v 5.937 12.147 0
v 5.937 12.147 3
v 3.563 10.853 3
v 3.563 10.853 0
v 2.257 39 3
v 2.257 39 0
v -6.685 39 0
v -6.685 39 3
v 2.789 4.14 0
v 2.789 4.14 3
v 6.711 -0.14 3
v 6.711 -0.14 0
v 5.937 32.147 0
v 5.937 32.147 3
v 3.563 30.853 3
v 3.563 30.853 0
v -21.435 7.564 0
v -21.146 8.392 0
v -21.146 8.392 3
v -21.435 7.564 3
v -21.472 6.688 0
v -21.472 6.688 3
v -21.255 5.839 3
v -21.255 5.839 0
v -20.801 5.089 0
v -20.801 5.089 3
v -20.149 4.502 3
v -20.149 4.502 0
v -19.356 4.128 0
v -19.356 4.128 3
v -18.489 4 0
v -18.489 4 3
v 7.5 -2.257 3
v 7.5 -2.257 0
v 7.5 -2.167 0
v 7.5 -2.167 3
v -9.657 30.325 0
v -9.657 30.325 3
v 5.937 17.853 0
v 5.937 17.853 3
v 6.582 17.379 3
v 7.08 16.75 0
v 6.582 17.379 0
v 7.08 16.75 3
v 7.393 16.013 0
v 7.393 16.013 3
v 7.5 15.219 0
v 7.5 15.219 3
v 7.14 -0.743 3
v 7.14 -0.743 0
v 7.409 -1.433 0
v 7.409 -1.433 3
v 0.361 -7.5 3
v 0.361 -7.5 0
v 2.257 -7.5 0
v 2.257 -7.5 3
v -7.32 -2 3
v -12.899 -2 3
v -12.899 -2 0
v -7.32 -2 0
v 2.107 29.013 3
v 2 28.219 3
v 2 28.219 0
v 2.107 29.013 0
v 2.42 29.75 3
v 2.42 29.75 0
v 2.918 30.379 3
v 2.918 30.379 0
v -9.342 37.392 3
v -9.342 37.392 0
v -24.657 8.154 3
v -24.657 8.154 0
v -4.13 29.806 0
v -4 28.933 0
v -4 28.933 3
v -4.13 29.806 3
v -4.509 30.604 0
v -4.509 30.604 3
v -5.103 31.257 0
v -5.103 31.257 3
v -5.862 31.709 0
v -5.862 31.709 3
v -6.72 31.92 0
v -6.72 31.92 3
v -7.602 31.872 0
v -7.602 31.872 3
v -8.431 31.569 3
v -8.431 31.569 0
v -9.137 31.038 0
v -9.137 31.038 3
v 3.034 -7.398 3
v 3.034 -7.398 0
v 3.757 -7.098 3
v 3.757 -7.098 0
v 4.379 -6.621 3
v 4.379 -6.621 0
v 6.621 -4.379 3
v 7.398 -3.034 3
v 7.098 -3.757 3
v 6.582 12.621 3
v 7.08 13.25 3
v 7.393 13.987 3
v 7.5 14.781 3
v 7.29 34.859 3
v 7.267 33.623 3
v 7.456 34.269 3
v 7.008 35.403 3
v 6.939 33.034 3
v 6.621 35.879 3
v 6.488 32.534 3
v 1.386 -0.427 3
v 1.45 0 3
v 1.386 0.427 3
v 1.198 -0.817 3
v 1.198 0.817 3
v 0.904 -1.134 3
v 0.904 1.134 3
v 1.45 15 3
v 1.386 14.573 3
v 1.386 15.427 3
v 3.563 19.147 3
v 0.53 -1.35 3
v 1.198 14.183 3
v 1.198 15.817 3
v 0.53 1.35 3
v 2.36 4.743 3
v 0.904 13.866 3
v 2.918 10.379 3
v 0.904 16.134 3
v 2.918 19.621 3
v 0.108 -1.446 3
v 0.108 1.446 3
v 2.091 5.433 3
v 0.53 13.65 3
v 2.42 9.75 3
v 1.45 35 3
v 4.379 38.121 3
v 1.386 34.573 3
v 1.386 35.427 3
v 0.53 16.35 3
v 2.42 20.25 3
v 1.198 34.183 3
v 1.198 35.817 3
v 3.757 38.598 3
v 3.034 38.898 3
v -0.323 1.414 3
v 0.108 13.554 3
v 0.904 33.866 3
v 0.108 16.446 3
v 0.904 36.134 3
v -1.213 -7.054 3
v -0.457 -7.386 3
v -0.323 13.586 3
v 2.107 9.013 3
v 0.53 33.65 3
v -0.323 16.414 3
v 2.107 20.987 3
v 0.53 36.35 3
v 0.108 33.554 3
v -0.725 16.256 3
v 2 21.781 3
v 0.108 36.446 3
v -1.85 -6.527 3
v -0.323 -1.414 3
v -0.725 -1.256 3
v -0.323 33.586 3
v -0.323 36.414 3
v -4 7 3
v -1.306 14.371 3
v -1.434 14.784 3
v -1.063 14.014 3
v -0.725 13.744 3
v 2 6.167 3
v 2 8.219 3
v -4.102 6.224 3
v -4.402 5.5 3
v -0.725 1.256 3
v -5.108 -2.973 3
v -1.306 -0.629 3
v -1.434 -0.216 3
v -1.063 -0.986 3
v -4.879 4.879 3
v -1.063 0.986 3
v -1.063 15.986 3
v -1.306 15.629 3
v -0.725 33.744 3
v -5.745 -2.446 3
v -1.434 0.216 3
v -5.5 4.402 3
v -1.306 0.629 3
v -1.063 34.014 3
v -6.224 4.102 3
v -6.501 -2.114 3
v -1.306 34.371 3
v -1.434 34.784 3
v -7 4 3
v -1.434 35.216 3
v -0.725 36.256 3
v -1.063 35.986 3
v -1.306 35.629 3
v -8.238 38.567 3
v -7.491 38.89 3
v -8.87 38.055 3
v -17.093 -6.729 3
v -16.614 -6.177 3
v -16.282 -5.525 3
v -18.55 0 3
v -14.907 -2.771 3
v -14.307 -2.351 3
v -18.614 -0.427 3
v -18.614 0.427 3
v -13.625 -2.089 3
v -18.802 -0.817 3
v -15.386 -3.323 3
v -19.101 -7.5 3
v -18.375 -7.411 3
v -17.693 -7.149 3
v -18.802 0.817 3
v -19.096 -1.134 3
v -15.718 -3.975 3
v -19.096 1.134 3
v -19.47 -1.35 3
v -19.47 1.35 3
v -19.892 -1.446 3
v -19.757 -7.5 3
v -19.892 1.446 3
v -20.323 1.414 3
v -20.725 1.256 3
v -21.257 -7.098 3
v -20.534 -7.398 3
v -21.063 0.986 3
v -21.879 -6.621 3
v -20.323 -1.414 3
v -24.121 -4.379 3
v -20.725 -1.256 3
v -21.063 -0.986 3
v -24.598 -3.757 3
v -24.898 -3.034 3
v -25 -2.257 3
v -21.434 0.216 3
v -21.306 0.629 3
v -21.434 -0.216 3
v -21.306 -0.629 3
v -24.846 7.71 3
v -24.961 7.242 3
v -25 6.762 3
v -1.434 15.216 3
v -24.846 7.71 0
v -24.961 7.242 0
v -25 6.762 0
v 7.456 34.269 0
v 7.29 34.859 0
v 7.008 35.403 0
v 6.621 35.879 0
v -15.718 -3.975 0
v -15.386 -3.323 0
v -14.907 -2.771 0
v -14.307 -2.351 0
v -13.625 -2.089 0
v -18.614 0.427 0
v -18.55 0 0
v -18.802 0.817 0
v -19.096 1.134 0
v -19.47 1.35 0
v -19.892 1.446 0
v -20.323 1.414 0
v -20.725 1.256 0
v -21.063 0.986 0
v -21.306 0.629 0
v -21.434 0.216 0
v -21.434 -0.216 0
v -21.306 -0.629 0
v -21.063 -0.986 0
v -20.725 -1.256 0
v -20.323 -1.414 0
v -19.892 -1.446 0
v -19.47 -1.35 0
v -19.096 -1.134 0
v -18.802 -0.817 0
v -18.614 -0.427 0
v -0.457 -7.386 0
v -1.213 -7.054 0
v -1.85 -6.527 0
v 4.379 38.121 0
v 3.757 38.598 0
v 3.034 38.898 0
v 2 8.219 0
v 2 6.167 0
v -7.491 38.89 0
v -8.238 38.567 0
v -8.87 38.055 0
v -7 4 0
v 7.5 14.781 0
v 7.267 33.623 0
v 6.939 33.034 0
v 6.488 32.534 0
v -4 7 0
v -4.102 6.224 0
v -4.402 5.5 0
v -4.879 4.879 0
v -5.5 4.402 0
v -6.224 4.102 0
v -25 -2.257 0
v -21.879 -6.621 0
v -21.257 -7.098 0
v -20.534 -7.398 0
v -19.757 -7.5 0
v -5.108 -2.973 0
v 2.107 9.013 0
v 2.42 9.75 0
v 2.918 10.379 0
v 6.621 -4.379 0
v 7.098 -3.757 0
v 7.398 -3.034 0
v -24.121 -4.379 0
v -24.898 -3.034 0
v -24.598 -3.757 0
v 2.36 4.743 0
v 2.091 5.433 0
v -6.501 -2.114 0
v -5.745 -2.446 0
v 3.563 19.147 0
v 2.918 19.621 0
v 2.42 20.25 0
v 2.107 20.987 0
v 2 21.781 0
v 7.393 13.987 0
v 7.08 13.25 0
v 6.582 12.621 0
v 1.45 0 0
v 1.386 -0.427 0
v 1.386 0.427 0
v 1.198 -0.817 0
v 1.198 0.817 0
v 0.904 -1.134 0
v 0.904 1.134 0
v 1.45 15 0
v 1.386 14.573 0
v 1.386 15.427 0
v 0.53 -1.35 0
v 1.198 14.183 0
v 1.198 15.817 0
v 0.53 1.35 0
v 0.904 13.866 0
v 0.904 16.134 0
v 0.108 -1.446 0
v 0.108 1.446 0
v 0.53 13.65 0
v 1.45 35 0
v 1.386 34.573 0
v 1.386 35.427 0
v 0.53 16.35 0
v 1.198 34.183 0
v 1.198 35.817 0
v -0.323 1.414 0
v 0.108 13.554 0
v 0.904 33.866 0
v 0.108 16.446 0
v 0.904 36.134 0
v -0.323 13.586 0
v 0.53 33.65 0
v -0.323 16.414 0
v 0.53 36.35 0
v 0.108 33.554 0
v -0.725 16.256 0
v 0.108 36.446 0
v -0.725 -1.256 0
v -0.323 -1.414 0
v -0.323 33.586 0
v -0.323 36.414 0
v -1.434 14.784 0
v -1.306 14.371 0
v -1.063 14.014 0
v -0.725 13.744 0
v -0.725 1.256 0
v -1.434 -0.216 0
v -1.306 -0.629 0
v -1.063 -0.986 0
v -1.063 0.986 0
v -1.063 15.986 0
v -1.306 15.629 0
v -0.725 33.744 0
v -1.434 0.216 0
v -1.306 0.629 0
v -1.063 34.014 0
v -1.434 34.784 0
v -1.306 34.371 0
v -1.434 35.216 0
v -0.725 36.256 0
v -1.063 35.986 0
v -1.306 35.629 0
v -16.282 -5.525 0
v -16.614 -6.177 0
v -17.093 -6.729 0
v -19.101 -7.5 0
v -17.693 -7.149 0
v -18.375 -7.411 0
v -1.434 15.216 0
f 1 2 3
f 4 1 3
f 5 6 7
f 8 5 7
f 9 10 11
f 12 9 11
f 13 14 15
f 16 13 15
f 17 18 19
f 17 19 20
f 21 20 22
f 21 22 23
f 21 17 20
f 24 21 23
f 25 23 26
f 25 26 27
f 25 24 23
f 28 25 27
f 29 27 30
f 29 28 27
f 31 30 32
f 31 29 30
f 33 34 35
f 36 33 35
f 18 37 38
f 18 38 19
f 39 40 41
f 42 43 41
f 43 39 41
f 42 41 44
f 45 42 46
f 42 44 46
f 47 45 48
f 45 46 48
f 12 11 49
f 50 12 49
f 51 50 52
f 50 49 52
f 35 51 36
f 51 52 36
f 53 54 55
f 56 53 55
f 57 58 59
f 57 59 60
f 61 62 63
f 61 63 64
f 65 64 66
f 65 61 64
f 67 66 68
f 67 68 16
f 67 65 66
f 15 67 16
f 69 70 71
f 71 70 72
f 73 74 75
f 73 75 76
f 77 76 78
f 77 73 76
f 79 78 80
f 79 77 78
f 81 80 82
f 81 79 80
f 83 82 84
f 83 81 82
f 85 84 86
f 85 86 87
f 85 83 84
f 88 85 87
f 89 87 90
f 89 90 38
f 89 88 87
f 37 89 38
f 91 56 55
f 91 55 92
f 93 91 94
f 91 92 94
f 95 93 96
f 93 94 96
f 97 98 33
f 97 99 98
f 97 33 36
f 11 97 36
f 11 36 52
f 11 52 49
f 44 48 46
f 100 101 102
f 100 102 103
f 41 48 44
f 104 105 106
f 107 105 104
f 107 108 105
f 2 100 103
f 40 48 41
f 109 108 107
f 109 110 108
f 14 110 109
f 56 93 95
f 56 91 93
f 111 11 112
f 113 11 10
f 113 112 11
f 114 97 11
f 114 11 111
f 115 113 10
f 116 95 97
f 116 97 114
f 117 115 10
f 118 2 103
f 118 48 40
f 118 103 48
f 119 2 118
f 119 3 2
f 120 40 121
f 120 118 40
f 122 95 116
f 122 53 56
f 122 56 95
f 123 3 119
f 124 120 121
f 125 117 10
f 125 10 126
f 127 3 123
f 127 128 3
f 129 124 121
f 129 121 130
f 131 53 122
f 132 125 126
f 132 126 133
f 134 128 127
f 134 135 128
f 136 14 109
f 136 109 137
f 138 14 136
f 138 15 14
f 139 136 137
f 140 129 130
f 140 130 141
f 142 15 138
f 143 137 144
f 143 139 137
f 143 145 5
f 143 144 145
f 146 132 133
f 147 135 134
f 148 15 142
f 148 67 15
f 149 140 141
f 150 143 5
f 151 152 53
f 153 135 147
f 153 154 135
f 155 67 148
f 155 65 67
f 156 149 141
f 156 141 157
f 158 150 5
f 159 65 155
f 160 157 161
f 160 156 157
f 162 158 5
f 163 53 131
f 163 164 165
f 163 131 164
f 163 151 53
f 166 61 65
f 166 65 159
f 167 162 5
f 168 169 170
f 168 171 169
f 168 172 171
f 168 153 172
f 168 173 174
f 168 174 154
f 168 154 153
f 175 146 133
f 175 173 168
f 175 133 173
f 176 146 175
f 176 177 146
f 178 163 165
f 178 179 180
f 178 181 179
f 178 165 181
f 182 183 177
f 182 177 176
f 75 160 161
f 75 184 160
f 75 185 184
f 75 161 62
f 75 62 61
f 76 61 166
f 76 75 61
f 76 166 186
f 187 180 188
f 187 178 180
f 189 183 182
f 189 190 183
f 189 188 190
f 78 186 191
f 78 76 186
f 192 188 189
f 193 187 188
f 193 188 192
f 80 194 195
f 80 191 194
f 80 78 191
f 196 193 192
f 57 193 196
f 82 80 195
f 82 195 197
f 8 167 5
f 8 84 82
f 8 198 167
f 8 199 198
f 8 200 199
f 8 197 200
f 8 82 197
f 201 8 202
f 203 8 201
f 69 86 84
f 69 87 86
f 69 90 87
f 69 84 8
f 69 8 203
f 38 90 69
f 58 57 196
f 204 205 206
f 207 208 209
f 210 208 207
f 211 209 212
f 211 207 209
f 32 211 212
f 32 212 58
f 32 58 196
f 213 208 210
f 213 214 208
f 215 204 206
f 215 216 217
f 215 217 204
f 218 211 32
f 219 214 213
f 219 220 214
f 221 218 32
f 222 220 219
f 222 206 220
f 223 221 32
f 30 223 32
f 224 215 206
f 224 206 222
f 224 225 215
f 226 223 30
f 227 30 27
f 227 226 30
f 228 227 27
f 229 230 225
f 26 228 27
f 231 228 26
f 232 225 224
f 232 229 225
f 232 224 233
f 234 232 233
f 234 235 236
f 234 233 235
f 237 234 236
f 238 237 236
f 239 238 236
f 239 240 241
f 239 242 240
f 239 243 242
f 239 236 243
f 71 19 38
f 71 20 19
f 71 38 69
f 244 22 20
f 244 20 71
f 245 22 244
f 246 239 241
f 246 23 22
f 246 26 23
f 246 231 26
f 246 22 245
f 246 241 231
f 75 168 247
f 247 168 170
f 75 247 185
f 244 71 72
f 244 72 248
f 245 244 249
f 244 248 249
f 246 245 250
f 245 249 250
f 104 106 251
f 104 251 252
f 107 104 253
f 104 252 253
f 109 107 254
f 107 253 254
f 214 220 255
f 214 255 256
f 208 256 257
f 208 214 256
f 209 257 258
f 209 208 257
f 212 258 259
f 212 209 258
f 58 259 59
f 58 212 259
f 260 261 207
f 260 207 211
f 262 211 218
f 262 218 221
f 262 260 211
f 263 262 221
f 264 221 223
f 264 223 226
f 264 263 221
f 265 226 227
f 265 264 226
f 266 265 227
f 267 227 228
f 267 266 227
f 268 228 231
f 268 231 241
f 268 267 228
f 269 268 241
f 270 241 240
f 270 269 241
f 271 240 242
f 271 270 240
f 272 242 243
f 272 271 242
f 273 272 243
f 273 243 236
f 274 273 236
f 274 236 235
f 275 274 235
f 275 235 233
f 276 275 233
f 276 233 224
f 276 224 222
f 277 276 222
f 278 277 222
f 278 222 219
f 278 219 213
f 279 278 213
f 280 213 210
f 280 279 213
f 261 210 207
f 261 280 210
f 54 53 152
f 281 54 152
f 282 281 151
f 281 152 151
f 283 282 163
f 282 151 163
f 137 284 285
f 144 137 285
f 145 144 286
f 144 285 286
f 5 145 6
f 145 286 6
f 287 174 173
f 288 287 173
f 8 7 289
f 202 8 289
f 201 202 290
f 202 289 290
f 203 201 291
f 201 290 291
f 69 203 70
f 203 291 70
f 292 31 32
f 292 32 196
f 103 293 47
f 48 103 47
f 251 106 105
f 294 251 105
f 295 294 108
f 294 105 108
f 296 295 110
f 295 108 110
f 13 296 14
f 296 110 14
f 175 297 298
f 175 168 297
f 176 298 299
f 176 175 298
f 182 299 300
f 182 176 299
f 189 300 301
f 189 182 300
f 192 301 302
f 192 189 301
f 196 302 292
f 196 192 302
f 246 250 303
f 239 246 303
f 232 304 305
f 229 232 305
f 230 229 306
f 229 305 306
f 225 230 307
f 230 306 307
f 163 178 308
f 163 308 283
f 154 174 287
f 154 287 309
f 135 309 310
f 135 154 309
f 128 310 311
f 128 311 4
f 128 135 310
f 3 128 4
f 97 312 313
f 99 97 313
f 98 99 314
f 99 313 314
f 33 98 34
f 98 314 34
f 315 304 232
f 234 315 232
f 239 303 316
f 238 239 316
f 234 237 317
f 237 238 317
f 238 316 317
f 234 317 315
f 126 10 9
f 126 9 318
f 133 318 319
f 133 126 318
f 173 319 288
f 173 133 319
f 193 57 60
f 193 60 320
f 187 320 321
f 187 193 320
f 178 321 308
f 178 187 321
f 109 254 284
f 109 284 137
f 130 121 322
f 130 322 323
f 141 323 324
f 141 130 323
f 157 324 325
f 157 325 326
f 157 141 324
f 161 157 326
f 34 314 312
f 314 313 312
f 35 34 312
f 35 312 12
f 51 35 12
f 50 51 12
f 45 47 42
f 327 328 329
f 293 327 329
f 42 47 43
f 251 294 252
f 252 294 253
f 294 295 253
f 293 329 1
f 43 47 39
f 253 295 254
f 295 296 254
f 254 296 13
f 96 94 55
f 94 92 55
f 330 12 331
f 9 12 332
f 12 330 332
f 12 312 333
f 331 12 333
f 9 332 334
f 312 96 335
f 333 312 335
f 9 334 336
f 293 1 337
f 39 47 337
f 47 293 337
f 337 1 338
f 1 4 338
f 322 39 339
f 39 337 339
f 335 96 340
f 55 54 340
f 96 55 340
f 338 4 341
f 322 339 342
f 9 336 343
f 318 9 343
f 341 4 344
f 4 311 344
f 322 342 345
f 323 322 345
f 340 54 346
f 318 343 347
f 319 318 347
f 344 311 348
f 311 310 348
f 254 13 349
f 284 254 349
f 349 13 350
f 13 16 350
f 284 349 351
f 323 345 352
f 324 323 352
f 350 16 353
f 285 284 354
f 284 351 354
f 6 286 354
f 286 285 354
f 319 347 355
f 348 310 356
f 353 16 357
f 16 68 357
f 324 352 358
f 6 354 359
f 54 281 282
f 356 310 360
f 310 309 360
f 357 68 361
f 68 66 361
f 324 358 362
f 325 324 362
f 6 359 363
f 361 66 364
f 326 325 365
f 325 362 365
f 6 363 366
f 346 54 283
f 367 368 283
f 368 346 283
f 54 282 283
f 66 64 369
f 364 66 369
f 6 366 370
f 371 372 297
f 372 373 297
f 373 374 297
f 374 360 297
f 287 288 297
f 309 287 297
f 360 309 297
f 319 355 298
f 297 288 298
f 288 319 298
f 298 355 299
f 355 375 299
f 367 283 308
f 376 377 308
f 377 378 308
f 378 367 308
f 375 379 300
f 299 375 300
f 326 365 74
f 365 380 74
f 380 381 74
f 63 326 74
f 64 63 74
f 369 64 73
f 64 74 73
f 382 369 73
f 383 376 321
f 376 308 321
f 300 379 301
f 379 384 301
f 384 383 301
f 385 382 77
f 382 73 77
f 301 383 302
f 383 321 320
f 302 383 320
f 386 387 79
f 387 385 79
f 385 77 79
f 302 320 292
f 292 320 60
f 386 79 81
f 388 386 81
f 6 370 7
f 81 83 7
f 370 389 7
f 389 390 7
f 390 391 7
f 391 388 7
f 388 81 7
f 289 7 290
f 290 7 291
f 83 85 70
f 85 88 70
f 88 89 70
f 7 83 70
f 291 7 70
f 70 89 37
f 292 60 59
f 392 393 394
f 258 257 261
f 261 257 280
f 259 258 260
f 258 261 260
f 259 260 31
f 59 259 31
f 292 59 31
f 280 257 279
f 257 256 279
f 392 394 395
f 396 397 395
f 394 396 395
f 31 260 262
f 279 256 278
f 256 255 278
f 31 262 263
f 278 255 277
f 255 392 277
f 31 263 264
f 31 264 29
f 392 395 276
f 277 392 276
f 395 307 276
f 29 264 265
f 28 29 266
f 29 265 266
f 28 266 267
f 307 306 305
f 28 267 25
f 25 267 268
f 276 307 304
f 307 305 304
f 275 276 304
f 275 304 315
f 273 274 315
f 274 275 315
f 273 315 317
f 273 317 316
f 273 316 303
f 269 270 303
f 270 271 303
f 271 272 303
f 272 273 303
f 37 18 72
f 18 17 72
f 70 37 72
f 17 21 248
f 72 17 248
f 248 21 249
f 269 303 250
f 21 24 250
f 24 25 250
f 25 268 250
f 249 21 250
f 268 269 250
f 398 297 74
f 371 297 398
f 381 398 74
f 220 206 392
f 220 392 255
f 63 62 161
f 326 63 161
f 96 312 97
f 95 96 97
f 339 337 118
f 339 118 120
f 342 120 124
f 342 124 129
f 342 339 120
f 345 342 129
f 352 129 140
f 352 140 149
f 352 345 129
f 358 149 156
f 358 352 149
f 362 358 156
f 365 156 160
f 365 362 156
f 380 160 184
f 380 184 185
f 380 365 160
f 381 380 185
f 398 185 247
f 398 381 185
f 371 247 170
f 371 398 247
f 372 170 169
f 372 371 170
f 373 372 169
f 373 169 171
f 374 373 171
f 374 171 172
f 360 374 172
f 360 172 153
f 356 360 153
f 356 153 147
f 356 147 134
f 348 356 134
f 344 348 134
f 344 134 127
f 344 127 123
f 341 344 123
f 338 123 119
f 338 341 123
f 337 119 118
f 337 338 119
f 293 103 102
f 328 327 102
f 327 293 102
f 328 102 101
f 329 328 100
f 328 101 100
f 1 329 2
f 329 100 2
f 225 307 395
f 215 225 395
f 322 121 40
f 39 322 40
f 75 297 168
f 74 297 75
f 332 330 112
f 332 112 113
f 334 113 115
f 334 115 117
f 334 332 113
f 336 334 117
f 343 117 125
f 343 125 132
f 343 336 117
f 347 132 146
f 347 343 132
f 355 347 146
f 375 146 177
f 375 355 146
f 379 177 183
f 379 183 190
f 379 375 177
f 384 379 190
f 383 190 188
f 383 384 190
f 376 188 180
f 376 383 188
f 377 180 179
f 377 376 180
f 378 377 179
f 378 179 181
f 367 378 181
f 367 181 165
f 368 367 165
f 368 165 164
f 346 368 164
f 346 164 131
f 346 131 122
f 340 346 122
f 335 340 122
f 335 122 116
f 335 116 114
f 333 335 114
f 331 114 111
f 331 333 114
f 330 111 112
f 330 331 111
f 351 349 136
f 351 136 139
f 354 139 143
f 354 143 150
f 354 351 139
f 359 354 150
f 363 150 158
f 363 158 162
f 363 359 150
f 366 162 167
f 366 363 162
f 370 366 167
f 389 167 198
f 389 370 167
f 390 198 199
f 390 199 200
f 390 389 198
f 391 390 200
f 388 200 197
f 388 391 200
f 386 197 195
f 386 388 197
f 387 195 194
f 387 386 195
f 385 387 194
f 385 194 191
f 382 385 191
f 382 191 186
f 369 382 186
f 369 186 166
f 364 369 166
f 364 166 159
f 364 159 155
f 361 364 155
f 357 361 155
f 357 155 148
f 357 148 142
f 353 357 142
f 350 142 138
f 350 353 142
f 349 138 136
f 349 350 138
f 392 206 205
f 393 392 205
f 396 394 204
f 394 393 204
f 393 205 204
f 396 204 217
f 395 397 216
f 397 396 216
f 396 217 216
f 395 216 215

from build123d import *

# Parameters (mm, degrees)
SKETCH_1_R          = 1.45
EXTRUDE_1_DEPTH     = 3
CHAMFER_1_SIZE      = 4
CUT_EXTRUDE_1_DEPTH = 47.421977554
FILLET_1_R          = 3
FILLET_2_R          = 3


with BuildPart() as part:
    # 草图1 → 凸台-拉伸1 (new body)
    with BuildSketch(Plane.XY):
        Polygon((-25, 7.5), (-25, -7.5), (7.5, -7.5), (7.5, 39), (-8.5, 39), align=None)
        with Locations((-20, 0)):
            Circle(SKETCH_1_R, mode=Mode.SUBTRACT)
        Circle(SKETCH_1_R, mode=Mode.SUBTRACT)
        with Locations((0, 15)):
            Circle(SKETCH_1_R, mode=Mode.SUBTRACT)
        with Locations((0, 35)):
            Circle(SKETCH_1_R, mode=Mode.SUBTRACT)
        with BuildLine():
            Line((-9.657494606, 30.324817794), (-21.146102459, 8.392020984))
            ThreePointArc((-21.146102459, 8.392020984), (-21.055323941, 5.446948641), (-18.488607853, 4))
            Line((-18.488607853, 4), (-4, 4))
            Line((-4, 4), (-4, 28.93279681))
            ThreePointArc((-4, 28.93279681), (-6.283230796, 31.845912308), (-9.657494606, 30.324817794))
        make_face(mode=Mode.SUBTRACT)
    extrude(amount=EXTRUDE_1_DEPTH)

    # 倒角1
    chamfer_1_edges = [part.edges().sort_by_distance(p)[0] for p in [
        (7.5, 39, 1.5),
        (7.5, -7.5, 1.5),
        (-25, -7.5, 1.5),
    ]]
    chamfer(chamfer_1_edges, length=CHAMFER_1_SIZE)

    # 草图2 → 切除-拉伸1 (cut, through all)
    with BuildSketch(Plane.XY.offset(3)):
        Polygon((-17, -7.5), (-15, -2), (-6, -2), (-0.958333333, -7.5), align=None)
        Polygon((7.5, 33), (2, 30), (2, 20), (7.5, 17), align=None)
        Polygon((7.5, 13), (2, 10), (2, 5), (7.5, -1), align=None)
    extrude(amount=-CUT_EXTRUDE_1_DEPTH, mode=Mode.SUBTRACT)

    # 圆角1
    fillet_1_edges = [part.edges().sort_by_distance(p)[0] for p in [
        (-4, 4, 1.5),
    ]]
    fillet(fillet_1_edges, radius=FILLET_1_R)

    # 圆角2
    # the kernel refuses this fillet: 3 mm, written as the material it adds along each edge
    with BuildSketch(Plane(origin=(2, 5, 3), x_dir=(0, 1, 0), z_dir=(0, 0, -1))) as fillet_2_piece_1:
        with BuildLine():
            CenterArc((FILLET_2_R * 0.388983690555, FILLET_2_R), FILLET_2_R, 227.489552922, 42.510447078)
            Line((-FILLET_2_R * 0.286740937963, FILLET_2_R * 0.262845859799), (0, 0))
            Line((0, 0), (FILLET_2_R * 0.388983690555, 0))
        make_face()
    extrude(amount=3)
    with BuildSketch(Plane(origin=(2, 10, 3), x_dir=(0.8778955729143842, 0.4788521306805734, 0), z_dir=(0, 0, -1)), Plane(origin=(2, 20, 3), x_dir=(0, 1, 0), z_dir=(0, 0, -1)), Plane(origin=(2, 30, 3), x_dir=(0.8778955729143848, 0.4788521306805725, 0), z_dir=(0, 0, -1))) as fillet_2_piece_2:
        with BuildLine():
            CenterArc((FILLET_2_R * 0.59363309874, FILLET_2_R), FILLET_2_R, 208.610459666, 61.389540334)
            Line((-FILLET_2_R * 0.284262474174, FILLET_2_R * 0.521147869319), (0, 0))
            Line((0, 0), (FILLET_2_R * 0.59363309874, 0))
        make_face()
    extrude(amount=3)
    with BuildSketch(Plane(origin=(-15, -2, 3), x_dir=(1, 0, 0), z_dir=(0, 0, -1))) as fillet_2_piece_3:
        with BuildLine():
            CenterArc((FILLET_2_R * 0.700427264611, FILLET_2_R), FILLET_2_R, 199.983106522, 70.016893478)
            Line((-FILLET_2_R * 0.239366158878, FILLET_2_R * 0.658256936913), (0, 0))
            Line((0, 0), (FILLET_2_R * 0.700427264611, 0))
        make_face()
    extrude(amount=3)
    with BuildSketch(Plane(origin=(-6, -2, 3), x_dir=(0.6757246285173465, -0.7371541402007414, 0), z_dir=(0, 0, -1))) as fillet_2_piece_4:
        with BuildLine():
            CenterArc((FILLET_2_R * 0.439901716342, FILLET_2_R), FILLET_2_R, 222.510447078, 47.489552922)
            Line((-FILLET_2_R * 0.297252423859, FILLET_2_R * 0.324275371483), (0, 0))
            Line((0, 0), (FILLET_2_R * 0.439901716342, 0))
        make_face()
    extrude(amount=3)
    # the kernel refuses this fillet: 3 mm, written as the material it takes off along each edge
    with BuildSketch(Plane(origin=(7.5, 13, 7.452248241), x_dir=(0, 1, 0), z_dir=(0, 0, -1)), Plane(origin=(7.5, 33, 7.452248241), x_dir=(0, 1, 0), z_dir=(0, 0, -1)), Plane(origin=(7.5, 17, 7.452248241), x_dir=(-0.8778955729143842, 0.4788521306805734, 0), z_dir=(0, 0, -1))) as fillet_2_2_piece_1:
        with BuildLine():
            CenterArc((FILLET_2_R * 0.59363309874, -FILLET_2_R), FILLET_2_R, 90, 61.389540334)
            Line((-FILLET_2_R * 0.284262474174, -FILLET_2_R * 0.521147869319), (0, 0))
            Line((0, 0), (FILLET_2_R * 0.59363309874, 0))
        make_face()
    extrude(amount=11.904496481, mode=Mode.SUBTRACT)
    with BuildSketch(Plane(origin=(7.5, -1, 5.917377679), x_dir=(-0.6757246285173458, 0.7371541402007418, 0), z_dir=(0, 0, -1))) as fillet_2_2_piece_2:
        with BuildLine():
            CenterArc((FILLET_2_R * 0.388983690555, -FILLET_2_R), FILLET_2_R, 90, 42.510447078)
            Line((-FILLET_2_R * 0.286740937963, -FILLET_2_R * 0.262845859799), (0, 0))
            Line((0, 0), (FILLET_2_R * 0.388983690555, 0))
        make_face()
    extrude(amount=8.834755358, mode=Mode.SUBTRACT)
    with BuildSketch(Plane(origin=(3.5, -7.5, -3.106601718), x_dir=(0.7071067811865475, 0.7071067811865475, 0), z_dir=(0, 0, 1)), Plane(origin=(-21, -7.5, -3.106601718), x_dir=(1, 0, 0), z_dir=(0, 0, 1)), Plane(origin=(7.5, 35, -3.106601718), x_dir=(-0.7071067811865482, 0.7071067811865468, 0), z_dir=(0, 0, 1)), Plane(origin=(7.5, -3.5, -3.106601718), x_dir=(0, 1, 0), z_dir=(0, 0, 1)), Plane(origin=(3.5, 39, -3.106601718), x_dir=(-1, 0, 0), z_dir=(0, 0, 1))) as fillet_2_2_piece_3:
        with BuildLine():
            CenterArc((FILLET_2_R * 0.414213562373, FILLET_2_R), FILLET_2_R, 225, 45)
            Line((-FILLET_2_R * 0.292893218813, FILLET_2_R * 0.292893218813), (0, 0))
            Line((0, 0), (FILLET_2_R * 0.414213562373, 0))
        make_face()
    extrude(amount=9.213203436, mode=Mode.SUBTRACT)
    with BuildSketch(Plane(origin=(-25, -3.5, -3.106601718), x_dir=(0, 1, 0), z_dir=(0, 0, 1))) as fillet_2_2_piece_4:
        with BuildLine():
            CenterArc((FILLET_2_R * 0.414213562373, -FILLET_2_R), FILLET_2_R, 90, 45)
            Line((-FILLET_2_R * 0.292893218813, -FILLET_2_R * 0.292893218813), (0, 0))
            Line((0, 0), (FILLET_2_R * 0.414213562373, 0))
        make_face()
    extrude(amount=9.213203436, mode=Mode.SUBTRACT)
    with BuildSketch(Plane(origin=(-0.958333333, -7.5, 6.299262873), x_dir=(1, 0, 0), z_dir=(0, 0, -1))) as fillet_2_2_piece_5:
        with BuildLine():
            CenterArc((FILLET_2_R * 0.439901716342, -FILLET_2_R), FILLET_2_R, 90, 47.489552922)
            Line((-FILLET_2_R * 0.297252423859, -FILLET_2_R * 0.324275371483), (0, 0))
            Line((0, 0), (FILLET_2_R * 0.439901716342, 0))
        make_face()
    extrude(amount=9.598525745, mode=Mode.SUBTRACT)
    with BuildSketch(Plane(origin=(-17, -7.5, 8.253204485), x_dir=(0.341743063086704, 0.9397934234884372, 0), z_dir=(0, 0, -1))) as fillet_2_2_piece_6:
        with BuildLine():
            CenterArc((FILLET_2_R * 0.700427264611, -FILLET_2_R), FILLET_2_R, 90, 70.016893478)
            Line((-FILLET_2_R * 0.239366158878, -FILLET_2_R * 0.658256936913), (0, 0))
            Line((0, 0), (FILLET_2_R * 0.700427264611, 0))
        make_face()
    extrude(amount=13.506408969, mode=Mode.SUBTRACT)
    with BuildSketch(Plane(origin=(-8.5, 39, -4.538049708), x_dir=(-0.464006994670558, -0.8858315352801552, 0), z_dir=(0, 0, 1))) as fillet_2_2_piece_7:
        with BuildLine():
            CenterArc((FILLET_2_R * 0.605073294393, FILLET_2_R), FILLET_2_R, 207.645975364, 62.354024636)
            Line((-FILLET_2_R * 0.280758240887, FILLET_2_R * 0.535993005329), (0, 0))
            Line((0, 0), (FILLET_2_R * 0.605073294393, 0))
        make_face()
    extrude(amount=12.076099416, mode=Mode.SUBTRACT)
    with BuildSketch(Plane(origin=(-25, 7.5, -1.845367624), x_dir=(0, -1, 0), z_dir=(0, 0, 1))) as fillet_2_2_piece_8:
        with BuildLine():
            CenterArc((FILLET_2_R * 0.246049016569, FILLET_2_R), FILLET_2_R, 242.354024636, 27.645975364)
            Line((-FILLET_2_R * 0.217957978102, FILLET_2_R * 0.11416846472), (0, 0))
            Line((0, 0), (FILLET_2_R * 0.246049016569, 0))
        make_face()
    extrude(amount=6.690735249, mode=Mode.SUBTRACT)


solid = part.part
